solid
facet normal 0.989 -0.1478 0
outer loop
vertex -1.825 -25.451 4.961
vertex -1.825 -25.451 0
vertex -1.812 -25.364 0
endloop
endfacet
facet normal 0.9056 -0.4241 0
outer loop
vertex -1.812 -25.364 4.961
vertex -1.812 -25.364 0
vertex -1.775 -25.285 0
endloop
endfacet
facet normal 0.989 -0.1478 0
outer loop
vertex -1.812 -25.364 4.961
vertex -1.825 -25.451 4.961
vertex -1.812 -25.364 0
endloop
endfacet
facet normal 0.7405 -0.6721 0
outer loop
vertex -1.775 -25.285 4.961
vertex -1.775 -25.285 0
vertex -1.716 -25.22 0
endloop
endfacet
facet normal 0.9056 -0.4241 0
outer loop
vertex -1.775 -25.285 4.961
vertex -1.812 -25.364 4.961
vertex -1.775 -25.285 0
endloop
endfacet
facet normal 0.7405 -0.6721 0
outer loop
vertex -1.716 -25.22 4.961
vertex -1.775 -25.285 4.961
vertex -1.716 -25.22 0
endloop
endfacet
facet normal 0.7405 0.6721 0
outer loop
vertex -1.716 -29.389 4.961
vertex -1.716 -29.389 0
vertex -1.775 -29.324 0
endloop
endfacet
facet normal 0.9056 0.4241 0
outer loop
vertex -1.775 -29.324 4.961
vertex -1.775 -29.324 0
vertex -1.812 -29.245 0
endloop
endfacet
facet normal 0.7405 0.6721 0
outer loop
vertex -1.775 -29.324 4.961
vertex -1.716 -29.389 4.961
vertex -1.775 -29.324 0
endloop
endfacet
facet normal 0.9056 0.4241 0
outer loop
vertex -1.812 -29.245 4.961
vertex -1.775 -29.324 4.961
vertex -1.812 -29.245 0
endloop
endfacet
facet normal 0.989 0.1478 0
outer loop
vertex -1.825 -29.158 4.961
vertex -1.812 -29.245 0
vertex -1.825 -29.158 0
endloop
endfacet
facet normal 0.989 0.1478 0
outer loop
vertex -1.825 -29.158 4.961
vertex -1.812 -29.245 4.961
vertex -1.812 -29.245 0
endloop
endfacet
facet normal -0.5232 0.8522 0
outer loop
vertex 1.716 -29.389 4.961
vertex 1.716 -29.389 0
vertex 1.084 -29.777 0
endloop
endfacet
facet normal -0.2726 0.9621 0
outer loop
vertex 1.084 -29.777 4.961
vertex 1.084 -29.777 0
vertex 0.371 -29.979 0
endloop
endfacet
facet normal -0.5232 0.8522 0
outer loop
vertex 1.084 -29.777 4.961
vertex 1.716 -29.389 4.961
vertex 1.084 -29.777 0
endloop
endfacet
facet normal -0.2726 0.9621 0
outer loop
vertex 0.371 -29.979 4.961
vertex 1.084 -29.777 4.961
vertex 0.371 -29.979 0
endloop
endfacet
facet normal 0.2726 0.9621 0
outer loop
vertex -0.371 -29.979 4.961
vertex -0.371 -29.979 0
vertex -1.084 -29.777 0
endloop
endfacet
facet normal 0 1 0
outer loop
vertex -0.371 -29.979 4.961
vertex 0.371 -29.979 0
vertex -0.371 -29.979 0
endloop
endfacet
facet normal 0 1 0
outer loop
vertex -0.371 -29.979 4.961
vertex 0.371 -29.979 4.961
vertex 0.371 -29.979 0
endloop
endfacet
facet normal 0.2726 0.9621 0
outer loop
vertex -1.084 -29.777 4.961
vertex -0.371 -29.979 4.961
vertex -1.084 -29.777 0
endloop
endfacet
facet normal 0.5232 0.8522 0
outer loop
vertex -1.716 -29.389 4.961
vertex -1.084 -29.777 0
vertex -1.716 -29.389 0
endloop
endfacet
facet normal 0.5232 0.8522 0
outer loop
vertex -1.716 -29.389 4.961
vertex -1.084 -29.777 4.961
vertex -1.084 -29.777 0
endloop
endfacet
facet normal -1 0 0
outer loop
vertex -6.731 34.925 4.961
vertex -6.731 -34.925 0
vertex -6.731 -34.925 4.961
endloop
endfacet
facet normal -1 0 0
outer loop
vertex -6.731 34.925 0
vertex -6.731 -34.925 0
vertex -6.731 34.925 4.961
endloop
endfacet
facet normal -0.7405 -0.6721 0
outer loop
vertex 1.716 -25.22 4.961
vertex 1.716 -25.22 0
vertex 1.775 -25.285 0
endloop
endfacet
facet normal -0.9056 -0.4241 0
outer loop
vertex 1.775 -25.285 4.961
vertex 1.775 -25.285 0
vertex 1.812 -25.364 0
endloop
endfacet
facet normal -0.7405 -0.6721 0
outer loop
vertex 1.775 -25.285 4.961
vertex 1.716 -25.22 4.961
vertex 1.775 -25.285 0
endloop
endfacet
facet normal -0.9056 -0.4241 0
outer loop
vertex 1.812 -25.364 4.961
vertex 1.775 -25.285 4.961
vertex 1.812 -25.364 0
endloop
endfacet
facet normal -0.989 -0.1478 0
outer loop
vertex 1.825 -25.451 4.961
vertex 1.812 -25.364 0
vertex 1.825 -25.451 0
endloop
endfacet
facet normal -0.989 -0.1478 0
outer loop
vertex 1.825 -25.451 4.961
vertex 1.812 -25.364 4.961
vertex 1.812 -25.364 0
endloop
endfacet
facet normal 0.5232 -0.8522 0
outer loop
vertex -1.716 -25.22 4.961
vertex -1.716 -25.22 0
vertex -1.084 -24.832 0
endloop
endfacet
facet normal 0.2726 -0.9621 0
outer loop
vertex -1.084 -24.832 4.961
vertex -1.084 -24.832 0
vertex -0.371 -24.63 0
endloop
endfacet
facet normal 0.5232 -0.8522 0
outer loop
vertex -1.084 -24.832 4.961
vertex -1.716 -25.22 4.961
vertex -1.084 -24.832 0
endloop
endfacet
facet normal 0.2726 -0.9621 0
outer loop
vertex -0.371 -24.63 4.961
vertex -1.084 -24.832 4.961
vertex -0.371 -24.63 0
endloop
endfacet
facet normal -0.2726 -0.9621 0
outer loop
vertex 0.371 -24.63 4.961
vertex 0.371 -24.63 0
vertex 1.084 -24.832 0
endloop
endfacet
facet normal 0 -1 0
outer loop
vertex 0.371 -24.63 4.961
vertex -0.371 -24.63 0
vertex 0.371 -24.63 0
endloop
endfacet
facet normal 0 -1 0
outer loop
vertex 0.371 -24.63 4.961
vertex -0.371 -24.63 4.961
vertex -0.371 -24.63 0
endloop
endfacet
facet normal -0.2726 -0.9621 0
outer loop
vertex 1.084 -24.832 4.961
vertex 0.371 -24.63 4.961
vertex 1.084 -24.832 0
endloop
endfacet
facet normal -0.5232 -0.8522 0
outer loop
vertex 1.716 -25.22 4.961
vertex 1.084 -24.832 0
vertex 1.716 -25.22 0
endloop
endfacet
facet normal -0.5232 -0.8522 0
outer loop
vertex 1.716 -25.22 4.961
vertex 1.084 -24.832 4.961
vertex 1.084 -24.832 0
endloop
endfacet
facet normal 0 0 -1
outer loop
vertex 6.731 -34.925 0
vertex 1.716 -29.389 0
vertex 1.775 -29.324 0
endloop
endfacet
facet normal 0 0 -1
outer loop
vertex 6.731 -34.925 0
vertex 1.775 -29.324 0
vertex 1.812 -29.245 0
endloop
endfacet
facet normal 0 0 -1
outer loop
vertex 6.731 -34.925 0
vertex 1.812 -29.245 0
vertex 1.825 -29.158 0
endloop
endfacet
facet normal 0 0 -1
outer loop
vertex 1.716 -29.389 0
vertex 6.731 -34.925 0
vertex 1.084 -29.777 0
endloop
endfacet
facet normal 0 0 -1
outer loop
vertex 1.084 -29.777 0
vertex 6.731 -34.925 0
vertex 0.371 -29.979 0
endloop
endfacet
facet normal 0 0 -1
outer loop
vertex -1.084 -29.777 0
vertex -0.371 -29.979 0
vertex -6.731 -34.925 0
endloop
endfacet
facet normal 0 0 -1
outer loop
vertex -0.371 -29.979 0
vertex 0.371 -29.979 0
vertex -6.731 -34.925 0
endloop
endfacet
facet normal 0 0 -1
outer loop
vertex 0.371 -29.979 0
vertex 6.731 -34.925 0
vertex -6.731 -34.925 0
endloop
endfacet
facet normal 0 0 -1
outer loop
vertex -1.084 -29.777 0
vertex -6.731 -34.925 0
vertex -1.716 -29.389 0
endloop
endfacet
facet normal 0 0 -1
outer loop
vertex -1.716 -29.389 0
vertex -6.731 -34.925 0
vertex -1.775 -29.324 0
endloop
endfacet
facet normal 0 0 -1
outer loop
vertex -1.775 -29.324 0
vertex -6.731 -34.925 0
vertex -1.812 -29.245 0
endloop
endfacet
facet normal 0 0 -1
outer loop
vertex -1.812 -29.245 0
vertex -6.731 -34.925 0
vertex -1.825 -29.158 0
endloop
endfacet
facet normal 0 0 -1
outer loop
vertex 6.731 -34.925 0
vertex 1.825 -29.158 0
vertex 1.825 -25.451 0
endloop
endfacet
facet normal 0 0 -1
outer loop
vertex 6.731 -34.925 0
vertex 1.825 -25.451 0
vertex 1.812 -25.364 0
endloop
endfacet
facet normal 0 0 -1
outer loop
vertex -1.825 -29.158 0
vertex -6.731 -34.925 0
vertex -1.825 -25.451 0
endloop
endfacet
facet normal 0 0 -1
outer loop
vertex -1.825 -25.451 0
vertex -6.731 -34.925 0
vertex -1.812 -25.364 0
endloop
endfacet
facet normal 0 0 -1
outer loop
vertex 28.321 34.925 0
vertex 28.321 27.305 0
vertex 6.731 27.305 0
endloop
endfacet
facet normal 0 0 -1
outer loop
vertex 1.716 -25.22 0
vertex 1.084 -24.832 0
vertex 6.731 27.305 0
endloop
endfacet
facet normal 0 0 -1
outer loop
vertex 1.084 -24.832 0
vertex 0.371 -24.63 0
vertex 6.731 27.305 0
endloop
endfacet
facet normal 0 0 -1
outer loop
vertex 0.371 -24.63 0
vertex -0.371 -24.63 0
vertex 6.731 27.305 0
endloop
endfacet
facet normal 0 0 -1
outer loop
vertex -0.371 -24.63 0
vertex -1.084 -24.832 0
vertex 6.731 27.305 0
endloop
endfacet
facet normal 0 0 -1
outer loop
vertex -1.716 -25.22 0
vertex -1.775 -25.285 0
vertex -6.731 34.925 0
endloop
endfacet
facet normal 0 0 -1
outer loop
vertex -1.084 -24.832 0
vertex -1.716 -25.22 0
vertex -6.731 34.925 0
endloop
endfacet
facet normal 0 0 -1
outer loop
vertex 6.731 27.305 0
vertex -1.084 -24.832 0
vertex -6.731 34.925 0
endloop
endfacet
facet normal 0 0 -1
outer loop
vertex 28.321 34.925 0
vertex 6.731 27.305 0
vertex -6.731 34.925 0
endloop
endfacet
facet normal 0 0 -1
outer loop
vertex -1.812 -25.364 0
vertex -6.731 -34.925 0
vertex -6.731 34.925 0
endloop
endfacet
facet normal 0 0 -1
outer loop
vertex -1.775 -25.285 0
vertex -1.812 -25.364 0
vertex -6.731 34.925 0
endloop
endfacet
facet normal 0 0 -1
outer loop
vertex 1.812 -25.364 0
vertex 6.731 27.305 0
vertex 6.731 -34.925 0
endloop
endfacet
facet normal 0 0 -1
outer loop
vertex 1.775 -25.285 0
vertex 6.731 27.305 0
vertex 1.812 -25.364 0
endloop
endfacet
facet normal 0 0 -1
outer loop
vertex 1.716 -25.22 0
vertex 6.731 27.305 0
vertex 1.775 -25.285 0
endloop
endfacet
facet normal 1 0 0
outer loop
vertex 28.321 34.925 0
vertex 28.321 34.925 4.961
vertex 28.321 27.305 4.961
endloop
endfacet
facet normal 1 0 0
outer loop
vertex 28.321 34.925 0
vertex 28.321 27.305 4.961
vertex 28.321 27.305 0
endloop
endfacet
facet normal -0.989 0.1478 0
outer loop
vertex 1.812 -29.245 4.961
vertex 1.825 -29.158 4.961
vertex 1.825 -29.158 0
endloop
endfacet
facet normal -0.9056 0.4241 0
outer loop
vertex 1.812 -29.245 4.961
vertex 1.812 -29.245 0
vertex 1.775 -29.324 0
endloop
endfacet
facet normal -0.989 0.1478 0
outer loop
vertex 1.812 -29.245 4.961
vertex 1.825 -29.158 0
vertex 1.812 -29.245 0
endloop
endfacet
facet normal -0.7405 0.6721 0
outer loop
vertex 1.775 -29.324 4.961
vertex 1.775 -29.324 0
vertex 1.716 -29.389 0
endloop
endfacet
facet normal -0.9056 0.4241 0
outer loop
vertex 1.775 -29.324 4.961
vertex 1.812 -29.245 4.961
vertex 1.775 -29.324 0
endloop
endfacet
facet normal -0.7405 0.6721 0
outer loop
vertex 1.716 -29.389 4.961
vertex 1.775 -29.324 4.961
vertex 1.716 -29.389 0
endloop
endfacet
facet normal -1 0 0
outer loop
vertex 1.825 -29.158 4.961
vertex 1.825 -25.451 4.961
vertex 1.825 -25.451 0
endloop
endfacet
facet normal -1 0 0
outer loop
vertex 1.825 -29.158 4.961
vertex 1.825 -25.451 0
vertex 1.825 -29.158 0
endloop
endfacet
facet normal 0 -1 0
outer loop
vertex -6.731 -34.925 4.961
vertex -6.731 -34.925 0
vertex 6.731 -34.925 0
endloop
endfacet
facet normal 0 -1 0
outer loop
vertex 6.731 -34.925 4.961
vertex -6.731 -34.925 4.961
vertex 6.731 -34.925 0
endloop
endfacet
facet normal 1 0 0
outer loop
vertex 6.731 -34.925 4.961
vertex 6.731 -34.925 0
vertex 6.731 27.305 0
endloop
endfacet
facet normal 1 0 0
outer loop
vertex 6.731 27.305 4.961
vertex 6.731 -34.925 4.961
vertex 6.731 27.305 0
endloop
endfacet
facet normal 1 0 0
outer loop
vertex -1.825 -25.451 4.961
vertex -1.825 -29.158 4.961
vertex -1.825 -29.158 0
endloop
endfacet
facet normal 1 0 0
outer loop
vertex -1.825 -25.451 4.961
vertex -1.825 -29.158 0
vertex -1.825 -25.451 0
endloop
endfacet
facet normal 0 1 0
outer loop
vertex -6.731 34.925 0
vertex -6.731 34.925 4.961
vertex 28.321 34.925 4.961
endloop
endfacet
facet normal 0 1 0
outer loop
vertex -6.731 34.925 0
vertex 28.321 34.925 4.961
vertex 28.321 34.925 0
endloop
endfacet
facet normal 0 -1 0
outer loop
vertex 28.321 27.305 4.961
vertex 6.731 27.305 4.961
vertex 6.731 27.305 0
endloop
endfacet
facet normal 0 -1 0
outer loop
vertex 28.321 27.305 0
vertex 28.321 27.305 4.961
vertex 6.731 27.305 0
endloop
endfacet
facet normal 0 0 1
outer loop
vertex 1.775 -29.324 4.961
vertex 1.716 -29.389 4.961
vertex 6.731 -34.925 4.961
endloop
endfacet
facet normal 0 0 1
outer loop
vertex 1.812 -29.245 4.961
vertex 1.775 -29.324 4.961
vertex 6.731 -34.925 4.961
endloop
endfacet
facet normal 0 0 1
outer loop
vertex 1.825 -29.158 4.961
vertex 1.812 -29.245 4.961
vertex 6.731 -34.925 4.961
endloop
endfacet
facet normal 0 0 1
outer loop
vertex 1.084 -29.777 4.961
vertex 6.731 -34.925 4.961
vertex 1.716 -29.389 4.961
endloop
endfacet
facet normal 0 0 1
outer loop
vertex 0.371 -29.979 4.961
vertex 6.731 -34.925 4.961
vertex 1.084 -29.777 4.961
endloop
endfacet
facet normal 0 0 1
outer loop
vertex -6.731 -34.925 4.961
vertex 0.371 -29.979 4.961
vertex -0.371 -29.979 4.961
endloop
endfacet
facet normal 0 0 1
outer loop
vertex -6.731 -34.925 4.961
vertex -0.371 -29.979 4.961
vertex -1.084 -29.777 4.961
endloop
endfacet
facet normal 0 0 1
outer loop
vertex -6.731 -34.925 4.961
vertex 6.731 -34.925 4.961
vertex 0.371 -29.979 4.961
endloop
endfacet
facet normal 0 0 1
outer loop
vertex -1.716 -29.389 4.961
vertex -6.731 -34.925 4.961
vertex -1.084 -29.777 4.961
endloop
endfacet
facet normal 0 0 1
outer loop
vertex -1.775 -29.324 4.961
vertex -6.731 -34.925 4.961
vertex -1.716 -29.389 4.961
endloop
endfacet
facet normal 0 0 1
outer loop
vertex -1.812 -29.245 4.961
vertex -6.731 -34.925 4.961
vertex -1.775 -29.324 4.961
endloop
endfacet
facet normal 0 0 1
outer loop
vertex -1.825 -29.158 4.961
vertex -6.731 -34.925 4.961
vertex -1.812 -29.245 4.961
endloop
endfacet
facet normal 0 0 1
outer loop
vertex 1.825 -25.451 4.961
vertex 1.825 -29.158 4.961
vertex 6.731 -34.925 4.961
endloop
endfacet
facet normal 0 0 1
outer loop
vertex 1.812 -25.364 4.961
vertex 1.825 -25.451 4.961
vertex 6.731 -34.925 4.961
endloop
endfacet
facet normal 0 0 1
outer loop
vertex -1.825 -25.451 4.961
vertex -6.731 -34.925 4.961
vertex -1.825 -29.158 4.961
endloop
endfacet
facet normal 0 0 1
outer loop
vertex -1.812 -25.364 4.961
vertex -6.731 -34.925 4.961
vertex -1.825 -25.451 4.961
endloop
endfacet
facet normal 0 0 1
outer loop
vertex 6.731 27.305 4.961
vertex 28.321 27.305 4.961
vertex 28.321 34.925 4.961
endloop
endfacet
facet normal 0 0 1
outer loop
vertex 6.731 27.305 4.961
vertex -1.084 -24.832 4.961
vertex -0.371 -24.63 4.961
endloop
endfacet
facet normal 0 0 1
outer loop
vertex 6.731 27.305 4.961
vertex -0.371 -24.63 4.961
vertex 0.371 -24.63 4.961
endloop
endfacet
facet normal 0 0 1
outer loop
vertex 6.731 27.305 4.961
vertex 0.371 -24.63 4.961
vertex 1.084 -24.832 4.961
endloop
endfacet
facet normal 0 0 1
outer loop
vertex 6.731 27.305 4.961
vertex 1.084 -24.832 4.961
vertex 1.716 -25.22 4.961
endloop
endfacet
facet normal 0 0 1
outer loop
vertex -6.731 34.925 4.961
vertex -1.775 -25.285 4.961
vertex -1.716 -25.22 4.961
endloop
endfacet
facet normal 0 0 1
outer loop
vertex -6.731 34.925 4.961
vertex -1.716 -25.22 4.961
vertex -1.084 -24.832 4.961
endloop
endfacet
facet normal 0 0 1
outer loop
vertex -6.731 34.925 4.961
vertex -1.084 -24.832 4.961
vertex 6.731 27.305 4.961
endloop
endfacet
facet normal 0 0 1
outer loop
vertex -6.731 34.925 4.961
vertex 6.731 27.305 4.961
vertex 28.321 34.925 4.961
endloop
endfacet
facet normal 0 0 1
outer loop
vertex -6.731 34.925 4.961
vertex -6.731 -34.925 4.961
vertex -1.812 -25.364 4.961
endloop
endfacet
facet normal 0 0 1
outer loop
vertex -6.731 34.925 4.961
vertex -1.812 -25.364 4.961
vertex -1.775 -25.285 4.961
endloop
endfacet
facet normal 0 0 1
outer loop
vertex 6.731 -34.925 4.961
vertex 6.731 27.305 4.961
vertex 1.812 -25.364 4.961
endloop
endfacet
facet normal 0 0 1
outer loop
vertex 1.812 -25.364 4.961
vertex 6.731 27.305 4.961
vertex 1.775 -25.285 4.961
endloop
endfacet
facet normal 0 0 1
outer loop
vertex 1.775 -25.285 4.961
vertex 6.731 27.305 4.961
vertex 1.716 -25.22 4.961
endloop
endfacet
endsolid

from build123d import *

# Parameters (mm, degrees)
SKETCH1_W           = 13.462
SKETCH1_H           = 69.85
BOSS_EXTRUDE1_DEPTH = 4.9609375
SKETCH2_W           = 4.9609375
SKETCH2_H           = 7.62
BOSS_EXTRUDE2_DEPTH = 21.59
SKETCH3_OUTSIDE_W   = 52.714
SKETCH3_OUTSIDE_H   = 87.512
CUT_EXTRUDE1_DEPTH  = 5.9609375


with BuildPart() as part:
    # Sketch1 → Boss-Extrude1 (new body)
    with BuildSketch(Plane.XY):
        Rectangle(SKETCH1_W, SKETCH1_H)
    extrude(amount=BOSS_EXTRUDE1_DEPTH)

    # Sketch2 → Boss-Extrude2 (add)
    with BuildSketch(Plane(origin=(6.731, 0, 0), x_dir=(0, 0, -1), z_dir=(1, 0, 0))):
        with Locations((-2.48046875, 31.115)):
            Rectangle(SKETCH2_W, SKETCH2_H)
    extrude(amount=BOSS_EXTRUDE2_DEPTH)

    # Sketch3 outside → Cut-Extrude1 (cut, through all)
    with BuildSketch(Plane.XY.offset(4.9609375)):
        with Locations((10.795, 0)):
            Rectangle(SKETCH3_OUTSIDE_W, SKETCH3_OUTSIDE_H)
        Polygon((6.731, -34.925), (6.731, 27.305), (28.321, 27.305), (28.321, 34.925), (-6.731, 34.925), (-6.731, -34.925), align=None, mode=Mode.SUBTRACT)
        with BuildLine():
            Line((-1.825, -29.157786744), (-1.825, -25.451373384))
            ThreePointArc((-1.825, -25.451373384), (-1.79628168, -25.323286499), (-1.715625, -25.219722549))
            ThreePointArc((-1.715625, -25.219722549), (0, -24.604580064), (1.715625, -25.219722549))
            ThreePointArc((1.715625, -25.219722549), (1.79628168, -25.323286499), (1.825, -25.451373384))
            Line((1.825, -25.451373384), (1.825, -29.157786744))
            ThreePointArc((1.825, -29.157786744), (1.79628168, -29.285873629), (1.715625, -29.389437579))
            ThreePointArc((1.715625, -29.389437579), (0, -30.004580064), (-1.715625, -29.389437579))
            ThreePointArc((-1.715625, -29.389437579), (-1.79628168, -29.285873629), (-1.825, -29.157786744))
        make_face()
    extrude(amount=-CUT_EXTRUDE1_DEPTH, mode=Mode.SUBTRACT)


solid = part.part
